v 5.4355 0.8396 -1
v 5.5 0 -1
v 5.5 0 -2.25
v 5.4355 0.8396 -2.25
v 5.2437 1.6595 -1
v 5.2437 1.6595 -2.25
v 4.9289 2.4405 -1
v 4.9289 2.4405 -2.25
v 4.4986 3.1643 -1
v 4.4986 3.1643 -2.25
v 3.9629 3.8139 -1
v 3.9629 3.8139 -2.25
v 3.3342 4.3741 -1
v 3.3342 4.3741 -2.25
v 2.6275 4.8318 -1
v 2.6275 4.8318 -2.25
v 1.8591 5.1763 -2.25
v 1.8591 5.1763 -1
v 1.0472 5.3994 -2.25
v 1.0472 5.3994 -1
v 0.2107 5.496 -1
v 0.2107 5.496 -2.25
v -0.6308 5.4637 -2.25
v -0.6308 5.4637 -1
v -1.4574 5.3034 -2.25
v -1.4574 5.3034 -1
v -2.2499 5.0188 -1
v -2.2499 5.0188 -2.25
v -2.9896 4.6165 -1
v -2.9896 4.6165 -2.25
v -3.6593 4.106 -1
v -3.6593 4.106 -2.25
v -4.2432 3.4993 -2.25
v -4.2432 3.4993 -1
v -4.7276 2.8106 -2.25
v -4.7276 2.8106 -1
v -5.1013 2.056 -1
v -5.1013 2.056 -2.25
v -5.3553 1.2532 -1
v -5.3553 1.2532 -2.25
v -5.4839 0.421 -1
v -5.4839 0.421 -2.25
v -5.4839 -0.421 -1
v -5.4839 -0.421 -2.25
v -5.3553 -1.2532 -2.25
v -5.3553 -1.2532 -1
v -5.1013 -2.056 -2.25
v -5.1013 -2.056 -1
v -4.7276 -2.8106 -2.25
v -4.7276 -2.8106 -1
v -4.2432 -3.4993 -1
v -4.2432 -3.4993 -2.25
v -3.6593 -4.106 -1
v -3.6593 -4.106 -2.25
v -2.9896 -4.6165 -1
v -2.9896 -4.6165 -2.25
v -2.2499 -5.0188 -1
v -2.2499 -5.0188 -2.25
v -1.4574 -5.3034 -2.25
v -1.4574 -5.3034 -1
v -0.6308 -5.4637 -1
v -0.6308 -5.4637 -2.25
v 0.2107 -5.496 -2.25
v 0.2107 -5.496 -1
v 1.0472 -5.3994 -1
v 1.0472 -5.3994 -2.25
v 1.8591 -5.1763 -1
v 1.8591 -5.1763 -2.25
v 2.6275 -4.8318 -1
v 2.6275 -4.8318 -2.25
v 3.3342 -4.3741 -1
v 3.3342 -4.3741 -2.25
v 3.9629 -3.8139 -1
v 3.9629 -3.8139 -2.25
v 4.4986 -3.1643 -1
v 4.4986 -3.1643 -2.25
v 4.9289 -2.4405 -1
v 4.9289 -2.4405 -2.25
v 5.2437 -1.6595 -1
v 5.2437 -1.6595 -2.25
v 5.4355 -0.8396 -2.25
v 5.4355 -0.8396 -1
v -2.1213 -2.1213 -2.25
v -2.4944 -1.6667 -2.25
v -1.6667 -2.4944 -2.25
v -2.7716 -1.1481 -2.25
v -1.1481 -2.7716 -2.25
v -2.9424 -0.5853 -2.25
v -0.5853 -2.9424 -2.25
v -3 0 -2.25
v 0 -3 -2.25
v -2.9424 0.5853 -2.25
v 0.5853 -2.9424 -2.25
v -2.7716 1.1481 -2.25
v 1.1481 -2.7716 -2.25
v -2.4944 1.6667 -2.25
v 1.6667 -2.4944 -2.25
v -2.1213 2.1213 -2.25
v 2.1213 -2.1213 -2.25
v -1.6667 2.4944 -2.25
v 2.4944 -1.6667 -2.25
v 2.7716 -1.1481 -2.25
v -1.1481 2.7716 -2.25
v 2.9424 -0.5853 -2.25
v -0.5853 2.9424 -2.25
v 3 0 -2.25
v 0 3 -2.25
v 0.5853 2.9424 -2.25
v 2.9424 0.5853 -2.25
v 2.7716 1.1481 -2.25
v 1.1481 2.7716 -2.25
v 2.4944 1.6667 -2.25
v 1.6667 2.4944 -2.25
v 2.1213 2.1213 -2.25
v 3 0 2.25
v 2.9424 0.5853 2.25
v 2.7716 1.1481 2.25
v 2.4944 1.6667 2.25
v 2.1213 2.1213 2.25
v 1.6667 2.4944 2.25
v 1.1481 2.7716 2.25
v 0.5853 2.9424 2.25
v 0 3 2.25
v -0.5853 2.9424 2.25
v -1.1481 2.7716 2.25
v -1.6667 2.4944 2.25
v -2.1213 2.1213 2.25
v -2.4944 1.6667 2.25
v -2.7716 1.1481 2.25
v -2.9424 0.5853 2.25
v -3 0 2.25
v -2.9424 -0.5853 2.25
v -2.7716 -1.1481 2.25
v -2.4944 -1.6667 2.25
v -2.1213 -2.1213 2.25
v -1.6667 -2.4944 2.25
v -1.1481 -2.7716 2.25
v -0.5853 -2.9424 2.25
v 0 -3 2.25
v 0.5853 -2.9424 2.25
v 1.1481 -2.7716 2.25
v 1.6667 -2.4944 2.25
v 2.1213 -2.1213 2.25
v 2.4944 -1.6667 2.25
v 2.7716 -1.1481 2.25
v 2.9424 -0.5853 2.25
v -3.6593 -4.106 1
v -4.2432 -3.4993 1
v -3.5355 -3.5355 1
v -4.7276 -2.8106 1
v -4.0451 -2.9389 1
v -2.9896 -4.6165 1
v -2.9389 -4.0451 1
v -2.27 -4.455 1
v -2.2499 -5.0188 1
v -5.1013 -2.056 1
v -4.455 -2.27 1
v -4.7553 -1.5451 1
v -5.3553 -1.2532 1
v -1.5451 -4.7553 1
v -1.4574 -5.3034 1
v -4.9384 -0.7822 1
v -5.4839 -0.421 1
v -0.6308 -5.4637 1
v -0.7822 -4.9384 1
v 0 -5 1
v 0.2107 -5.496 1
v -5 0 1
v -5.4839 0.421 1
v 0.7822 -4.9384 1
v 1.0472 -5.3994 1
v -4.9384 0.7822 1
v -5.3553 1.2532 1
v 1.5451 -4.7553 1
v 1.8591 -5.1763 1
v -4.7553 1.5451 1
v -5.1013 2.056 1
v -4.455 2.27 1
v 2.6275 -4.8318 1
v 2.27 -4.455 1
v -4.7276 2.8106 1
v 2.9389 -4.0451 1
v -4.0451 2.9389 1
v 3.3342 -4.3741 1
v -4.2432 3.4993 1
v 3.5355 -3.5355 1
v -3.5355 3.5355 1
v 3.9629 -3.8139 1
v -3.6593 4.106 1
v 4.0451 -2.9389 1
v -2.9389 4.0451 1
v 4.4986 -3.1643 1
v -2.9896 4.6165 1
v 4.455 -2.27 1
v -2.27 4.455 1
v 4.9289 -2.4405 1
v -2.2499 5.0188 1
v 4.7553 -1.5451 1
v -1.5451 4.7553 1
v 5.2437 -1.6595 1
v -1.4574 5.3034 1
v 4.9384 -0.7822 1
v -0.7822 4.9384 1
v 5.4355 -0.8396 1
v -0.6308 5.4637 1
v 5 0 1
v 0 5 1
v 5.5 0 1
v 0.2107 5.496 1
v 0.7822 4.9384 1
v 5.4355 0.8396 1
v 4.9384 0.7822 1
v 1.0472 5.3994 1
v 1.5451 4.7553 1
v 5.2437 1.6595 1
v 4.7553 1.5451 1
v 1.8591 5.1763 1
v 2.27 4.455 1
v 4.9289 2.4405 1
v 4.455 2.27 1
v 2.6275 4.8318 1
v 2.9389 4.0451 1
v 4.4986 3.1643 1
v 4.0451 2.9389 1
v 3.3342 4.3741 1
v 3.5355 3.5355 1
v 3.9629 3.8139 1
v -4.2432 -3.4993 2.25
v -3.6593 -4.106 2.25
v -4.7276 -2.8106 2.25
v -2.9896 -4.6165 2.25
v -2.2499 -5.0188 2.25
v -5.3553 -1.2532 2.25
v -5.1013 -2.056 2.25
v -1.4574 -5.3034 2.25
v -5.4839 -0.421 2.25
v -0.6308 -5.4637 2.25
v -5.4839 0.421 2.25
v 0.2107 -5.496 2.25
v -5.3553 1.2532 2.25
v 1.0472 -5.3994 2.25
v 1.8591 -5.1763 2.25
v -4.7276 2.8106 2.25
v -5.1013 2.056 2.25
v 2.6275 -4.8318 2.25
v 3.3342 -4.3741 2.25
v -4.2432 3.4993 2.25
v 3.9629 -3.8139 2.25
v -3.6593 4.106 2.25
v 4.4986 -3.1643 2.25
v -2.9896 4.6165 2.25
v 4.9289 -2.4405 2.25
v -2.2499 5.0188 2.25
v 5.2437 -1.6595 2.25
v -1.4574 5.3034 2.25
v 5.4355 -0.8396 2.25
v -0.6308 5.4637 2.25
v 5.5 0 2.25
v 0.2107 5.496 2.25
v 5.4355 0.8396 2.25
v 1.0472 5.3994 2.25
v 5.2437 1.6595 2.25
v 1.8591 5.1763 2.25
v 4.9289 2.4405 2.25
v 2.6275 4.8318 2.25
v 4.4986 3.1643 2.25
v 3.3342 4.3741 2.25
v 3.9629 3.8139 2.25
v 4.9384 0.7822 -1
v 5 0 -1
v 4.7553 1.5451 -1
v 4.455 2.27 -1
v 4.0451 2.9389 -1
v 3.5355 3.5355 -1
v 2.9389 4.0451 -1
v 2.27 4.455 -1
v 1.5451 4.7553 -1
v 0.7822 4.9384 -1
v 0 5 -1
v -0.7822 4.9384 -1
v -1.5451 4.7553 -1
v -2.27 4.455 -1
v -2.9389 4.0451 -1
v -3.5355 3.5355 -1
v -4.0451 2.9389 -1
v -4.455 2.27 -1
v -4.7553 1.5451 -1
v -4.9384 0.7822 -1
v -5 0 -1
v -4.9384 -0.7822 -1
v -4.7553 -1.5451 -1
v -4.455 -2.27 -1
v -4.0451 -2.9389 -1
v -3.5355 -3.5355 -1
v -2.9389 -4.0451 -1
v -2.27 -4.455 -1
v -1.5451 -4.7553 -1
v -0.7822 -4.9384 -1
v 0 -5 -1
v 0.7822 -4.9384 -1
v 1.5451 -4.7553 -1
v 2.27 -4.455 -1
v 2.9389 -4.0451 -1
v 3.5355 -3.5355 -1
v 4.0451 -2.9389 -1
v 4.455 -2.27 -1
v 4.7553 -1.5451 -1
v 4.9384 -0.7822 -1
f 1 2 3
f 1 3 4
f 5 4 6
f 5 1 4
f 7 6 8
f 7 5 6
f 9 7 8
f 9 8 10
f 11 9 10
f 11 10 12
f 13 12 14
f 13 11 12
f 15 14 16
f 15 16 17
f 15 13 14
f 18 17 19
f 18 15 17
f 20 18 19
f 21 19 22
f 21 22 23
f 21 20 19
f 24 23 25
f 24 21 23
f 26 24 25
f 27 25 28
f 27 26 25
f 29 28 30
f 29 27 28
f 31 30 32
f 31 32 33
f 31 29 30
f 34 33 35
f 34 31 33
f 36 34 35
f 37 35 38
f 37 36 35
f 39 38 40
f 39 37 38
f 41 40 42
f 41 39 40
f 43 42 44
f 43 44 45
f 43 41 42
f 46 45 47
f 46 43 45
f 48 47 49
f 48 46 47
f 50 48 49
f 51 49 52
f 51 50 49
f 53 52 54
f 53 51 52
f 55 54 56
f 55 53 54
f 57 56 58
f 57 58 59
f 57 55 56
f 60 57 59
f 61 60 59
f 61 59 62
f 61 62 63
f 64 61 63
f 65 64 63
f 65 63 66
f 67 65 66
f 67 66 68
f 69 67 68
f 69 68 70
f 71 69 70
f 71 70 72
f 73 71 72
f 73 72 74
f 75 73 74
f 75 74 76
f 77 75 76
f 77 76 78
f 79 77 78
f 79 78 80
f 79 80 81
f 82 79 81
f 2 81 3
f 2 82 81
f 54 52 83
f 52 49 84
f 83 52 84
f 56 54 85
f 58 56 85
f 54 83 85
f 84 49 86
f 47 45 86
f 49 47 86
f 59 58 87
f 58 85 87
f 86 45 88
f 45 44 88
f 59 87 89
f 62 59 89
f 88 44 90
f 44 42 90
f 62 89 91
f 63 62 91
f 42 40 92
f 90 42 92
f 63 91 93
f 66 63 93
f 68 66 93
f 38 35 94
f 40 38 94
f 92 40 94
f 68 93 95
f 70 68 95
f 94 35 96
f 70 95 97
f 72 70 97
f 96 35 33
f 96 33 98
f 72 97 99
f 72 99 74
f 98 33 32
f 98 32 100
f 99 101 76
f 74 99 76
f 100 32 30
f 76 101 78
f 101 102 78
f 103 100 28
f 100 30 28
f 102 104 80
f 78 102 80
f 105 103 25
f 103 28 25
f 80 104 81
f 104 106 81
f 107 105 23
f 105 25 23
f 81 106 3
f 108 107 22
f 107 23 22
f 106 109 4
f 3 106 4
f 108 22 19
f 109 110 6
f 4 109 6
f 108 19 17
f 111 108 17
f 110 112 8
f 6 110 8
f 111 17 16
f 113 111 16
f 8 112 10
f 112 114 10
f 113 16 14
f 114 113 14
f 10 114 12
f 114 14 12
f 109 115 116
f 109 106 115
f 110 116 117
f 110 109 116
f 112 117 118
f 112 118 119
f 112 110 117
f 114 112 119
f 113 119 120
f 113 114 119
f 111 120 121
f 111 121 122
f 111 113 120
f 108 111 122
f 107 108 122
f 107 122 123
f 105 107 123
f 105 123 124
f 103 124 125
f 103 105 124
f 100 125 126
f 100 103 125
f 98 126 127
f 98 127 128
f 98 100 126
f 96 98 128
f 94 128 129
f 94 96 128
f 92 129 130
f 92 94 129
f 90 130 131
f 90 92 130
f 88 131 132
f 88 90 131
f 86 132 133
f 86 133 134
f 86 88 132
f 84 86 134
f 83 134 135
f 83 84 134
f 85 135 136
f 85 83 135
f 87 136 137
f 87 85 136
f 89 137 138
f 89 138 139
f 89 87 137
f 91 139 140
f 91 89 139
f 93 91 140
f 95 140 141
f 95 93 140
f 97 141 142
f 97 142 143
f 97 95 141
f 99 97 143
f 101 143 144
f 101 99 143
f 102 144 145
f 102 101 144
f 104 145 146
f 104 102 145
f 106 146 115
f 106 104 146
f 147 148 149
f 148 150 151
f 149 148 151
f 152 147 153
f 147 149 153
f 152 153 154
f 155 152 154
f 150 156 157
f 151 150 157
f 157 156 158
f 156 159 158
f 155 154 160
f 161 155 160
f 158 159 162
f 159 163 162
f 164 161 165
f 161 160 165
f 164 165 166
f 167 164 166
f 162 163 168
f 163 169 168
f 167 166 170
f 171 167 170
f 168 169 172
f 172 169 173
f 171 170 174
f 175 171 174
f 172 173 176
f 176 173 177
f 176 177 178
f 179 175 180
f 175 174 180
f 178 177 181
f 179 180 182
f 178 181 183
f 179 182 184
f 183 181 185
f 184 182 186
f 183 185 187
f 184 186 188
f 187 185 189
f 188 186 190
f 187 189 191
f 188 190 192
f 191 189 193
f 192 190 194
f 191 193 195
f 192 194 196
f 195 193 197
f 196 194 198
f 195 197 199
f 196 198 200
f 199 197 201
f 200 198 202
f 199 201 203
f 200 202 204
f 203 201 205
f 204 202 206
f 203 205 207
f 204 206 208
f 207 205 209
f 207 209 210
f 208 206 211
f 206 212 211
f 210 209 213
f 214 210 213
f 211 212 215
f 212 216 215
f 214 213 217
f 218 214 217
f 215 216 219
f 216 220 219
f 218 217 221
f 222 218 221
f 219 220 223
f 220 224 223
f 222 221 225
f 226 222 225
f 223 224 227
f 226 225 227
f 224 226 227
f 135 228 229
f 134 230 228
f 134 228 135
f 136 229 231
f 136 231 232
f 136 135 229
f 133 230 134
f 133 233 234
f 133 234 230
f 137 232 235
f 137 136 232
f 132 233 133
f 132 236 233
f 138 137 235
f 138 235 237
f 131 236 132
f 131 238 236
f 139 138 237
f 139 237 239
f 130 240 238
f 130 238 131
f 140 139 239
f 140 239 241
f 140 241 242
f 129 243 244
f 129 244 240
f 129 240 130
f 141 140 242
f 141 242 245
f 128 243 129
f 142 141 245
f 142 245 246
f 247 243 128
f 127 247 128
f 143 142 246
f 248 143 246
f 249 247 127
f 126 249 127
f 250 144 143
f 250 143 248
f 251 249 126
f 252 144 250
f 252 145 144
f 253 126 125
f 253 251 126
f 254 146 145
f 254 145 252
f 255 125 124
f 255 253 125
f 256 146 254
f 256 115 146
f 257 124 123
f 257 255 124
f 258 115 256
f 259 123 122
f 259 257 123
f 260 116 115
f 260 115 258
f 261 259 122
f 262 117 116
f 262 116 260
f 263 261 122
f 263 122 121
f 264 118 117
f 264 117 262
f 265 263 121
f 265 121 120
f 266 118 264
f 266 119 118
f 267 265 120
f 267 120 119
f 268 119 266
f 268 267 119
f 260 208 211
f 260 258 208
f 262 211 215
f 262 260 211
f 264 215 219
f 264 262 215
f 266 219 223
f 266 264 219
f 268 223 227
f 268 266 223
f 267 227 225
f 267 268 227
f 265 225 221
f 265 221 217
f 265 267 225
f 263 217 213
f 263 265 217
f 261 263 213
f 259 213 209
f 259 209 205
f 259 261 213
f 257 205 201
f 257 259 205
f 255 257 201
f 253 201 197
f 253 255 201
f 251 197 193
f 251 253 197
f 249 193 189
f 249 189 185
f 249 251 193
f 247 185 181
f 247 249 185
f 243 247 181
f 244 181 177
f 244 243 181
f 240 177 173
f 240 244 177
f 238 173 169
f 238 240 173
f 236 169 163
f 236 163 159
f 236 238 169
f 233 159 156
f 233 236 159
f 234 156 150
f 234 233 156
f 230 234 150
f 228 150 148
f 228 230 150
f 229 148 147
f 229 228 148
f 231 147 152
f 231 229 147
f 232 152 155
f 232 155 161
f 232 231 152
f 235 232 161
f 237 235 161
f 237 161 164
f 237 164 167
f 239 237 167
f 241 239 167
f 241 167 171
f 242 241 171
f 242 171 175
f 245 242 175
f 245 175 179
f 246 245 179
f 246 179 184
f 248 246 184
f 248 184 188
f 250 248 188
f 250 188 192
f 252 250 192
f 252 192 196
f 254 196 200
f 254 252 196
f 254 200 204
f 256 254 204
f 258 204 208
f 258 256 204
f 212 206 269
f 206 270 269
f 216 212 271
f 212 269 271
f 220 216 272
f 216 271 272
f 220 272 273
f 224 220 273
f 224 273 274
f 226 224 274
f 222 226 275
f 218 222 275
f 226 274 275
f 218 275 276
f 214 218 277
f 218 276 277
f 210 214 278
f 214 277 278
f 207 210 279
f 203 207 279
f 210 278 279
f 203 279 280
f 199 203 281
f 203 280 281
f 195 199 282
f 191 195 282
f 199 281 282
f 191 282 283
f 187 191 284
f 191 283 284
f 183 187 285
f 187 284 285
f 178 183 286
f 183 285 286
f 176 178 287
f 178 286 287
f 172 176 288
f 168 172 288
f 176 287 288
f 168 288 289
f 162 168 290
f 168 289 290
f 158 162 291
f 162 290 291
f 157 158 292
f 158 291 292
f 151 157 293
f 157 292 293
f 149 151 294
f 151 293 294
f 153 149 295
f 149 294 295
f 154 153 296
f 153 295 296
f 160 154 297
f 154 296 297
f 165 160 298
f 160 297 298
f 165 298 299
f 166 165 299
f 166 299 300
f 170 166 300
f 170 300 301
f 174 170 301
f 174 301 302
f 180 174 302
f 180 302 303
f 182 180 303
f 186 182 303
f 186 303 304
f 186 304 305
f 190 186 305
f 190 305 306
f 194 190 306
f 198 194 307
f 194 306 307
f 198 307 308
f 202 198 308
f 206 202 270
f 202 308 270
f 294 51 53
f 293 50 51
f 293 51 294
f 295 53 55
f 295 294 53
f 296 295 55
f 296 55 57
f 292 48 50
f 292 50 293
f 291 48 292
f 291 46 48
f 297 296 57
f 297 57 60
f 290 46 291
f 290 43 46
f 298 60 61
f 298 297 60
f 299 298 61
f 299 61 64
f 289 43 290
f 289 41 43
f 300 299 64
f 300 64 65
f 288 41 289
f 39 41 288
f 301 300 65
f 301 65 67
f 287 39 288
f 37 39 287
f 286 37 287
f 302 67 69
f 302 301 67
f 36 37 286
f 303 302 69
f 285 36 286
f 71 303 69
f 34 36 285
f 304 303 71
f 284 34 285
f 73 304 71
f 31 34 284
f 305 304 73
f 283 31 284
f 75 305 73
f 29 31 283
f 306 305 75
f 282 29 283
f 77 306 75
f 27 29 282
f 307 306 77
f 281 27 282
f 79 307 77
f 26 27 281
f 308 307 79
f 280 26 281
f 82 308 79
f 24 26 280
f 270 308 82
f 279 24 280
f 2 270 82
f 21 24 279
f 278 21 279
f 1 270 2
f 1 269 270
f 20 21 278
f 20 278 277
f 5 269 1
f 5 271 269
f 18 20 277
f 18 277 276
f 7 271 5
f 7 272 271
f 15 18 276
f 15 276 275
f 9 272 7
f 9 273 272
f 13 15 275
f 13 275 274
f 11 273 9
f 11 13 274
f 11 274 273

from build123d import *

# Parameters (mm, degrees)
SKETCH_2_R          = 5.5
SKETCH_2_R_2        = 3
EXTRUDE_1_DEPTH     = 2.25
SKETCH_3_OUTSIDE_W  = 16.238
SKETCH_3_OUTSIDE_H  = 16.238
SKETCH_3_OUTSIDE_R  = 5
CUT_EXTRUDE_1_DEPTH = 1


with BuildPart() as part:
    # 草图2 → 凸台-拉伸1 (new, symmetric)
    with BuildSketch(Plane.XY):
        Circle(SKETCH_2_R)
        Circle(SKETCH_2_R_2, mode=Mode.SUBTRACT)
    extrude(amount=EXTRUDE_1_DEPTH, both=True)

    # 草图3 outside → 切除-拉伸1 (cut, symmetric)
    with BuildSketch(Plane.XY):
        Rectangle(SKETCH_3_OUTSIDE_W, SKETCH_3_OUTSIDE_H)
        Circle(SKETCH_3_OUTSIDE_R, mode=Mode.SUBTRACT)
    extrude(amount=CUT_EXTRUDE_1_DEPTH, both=True, mode=Mode.SUBTRACT)


solid = part.part
